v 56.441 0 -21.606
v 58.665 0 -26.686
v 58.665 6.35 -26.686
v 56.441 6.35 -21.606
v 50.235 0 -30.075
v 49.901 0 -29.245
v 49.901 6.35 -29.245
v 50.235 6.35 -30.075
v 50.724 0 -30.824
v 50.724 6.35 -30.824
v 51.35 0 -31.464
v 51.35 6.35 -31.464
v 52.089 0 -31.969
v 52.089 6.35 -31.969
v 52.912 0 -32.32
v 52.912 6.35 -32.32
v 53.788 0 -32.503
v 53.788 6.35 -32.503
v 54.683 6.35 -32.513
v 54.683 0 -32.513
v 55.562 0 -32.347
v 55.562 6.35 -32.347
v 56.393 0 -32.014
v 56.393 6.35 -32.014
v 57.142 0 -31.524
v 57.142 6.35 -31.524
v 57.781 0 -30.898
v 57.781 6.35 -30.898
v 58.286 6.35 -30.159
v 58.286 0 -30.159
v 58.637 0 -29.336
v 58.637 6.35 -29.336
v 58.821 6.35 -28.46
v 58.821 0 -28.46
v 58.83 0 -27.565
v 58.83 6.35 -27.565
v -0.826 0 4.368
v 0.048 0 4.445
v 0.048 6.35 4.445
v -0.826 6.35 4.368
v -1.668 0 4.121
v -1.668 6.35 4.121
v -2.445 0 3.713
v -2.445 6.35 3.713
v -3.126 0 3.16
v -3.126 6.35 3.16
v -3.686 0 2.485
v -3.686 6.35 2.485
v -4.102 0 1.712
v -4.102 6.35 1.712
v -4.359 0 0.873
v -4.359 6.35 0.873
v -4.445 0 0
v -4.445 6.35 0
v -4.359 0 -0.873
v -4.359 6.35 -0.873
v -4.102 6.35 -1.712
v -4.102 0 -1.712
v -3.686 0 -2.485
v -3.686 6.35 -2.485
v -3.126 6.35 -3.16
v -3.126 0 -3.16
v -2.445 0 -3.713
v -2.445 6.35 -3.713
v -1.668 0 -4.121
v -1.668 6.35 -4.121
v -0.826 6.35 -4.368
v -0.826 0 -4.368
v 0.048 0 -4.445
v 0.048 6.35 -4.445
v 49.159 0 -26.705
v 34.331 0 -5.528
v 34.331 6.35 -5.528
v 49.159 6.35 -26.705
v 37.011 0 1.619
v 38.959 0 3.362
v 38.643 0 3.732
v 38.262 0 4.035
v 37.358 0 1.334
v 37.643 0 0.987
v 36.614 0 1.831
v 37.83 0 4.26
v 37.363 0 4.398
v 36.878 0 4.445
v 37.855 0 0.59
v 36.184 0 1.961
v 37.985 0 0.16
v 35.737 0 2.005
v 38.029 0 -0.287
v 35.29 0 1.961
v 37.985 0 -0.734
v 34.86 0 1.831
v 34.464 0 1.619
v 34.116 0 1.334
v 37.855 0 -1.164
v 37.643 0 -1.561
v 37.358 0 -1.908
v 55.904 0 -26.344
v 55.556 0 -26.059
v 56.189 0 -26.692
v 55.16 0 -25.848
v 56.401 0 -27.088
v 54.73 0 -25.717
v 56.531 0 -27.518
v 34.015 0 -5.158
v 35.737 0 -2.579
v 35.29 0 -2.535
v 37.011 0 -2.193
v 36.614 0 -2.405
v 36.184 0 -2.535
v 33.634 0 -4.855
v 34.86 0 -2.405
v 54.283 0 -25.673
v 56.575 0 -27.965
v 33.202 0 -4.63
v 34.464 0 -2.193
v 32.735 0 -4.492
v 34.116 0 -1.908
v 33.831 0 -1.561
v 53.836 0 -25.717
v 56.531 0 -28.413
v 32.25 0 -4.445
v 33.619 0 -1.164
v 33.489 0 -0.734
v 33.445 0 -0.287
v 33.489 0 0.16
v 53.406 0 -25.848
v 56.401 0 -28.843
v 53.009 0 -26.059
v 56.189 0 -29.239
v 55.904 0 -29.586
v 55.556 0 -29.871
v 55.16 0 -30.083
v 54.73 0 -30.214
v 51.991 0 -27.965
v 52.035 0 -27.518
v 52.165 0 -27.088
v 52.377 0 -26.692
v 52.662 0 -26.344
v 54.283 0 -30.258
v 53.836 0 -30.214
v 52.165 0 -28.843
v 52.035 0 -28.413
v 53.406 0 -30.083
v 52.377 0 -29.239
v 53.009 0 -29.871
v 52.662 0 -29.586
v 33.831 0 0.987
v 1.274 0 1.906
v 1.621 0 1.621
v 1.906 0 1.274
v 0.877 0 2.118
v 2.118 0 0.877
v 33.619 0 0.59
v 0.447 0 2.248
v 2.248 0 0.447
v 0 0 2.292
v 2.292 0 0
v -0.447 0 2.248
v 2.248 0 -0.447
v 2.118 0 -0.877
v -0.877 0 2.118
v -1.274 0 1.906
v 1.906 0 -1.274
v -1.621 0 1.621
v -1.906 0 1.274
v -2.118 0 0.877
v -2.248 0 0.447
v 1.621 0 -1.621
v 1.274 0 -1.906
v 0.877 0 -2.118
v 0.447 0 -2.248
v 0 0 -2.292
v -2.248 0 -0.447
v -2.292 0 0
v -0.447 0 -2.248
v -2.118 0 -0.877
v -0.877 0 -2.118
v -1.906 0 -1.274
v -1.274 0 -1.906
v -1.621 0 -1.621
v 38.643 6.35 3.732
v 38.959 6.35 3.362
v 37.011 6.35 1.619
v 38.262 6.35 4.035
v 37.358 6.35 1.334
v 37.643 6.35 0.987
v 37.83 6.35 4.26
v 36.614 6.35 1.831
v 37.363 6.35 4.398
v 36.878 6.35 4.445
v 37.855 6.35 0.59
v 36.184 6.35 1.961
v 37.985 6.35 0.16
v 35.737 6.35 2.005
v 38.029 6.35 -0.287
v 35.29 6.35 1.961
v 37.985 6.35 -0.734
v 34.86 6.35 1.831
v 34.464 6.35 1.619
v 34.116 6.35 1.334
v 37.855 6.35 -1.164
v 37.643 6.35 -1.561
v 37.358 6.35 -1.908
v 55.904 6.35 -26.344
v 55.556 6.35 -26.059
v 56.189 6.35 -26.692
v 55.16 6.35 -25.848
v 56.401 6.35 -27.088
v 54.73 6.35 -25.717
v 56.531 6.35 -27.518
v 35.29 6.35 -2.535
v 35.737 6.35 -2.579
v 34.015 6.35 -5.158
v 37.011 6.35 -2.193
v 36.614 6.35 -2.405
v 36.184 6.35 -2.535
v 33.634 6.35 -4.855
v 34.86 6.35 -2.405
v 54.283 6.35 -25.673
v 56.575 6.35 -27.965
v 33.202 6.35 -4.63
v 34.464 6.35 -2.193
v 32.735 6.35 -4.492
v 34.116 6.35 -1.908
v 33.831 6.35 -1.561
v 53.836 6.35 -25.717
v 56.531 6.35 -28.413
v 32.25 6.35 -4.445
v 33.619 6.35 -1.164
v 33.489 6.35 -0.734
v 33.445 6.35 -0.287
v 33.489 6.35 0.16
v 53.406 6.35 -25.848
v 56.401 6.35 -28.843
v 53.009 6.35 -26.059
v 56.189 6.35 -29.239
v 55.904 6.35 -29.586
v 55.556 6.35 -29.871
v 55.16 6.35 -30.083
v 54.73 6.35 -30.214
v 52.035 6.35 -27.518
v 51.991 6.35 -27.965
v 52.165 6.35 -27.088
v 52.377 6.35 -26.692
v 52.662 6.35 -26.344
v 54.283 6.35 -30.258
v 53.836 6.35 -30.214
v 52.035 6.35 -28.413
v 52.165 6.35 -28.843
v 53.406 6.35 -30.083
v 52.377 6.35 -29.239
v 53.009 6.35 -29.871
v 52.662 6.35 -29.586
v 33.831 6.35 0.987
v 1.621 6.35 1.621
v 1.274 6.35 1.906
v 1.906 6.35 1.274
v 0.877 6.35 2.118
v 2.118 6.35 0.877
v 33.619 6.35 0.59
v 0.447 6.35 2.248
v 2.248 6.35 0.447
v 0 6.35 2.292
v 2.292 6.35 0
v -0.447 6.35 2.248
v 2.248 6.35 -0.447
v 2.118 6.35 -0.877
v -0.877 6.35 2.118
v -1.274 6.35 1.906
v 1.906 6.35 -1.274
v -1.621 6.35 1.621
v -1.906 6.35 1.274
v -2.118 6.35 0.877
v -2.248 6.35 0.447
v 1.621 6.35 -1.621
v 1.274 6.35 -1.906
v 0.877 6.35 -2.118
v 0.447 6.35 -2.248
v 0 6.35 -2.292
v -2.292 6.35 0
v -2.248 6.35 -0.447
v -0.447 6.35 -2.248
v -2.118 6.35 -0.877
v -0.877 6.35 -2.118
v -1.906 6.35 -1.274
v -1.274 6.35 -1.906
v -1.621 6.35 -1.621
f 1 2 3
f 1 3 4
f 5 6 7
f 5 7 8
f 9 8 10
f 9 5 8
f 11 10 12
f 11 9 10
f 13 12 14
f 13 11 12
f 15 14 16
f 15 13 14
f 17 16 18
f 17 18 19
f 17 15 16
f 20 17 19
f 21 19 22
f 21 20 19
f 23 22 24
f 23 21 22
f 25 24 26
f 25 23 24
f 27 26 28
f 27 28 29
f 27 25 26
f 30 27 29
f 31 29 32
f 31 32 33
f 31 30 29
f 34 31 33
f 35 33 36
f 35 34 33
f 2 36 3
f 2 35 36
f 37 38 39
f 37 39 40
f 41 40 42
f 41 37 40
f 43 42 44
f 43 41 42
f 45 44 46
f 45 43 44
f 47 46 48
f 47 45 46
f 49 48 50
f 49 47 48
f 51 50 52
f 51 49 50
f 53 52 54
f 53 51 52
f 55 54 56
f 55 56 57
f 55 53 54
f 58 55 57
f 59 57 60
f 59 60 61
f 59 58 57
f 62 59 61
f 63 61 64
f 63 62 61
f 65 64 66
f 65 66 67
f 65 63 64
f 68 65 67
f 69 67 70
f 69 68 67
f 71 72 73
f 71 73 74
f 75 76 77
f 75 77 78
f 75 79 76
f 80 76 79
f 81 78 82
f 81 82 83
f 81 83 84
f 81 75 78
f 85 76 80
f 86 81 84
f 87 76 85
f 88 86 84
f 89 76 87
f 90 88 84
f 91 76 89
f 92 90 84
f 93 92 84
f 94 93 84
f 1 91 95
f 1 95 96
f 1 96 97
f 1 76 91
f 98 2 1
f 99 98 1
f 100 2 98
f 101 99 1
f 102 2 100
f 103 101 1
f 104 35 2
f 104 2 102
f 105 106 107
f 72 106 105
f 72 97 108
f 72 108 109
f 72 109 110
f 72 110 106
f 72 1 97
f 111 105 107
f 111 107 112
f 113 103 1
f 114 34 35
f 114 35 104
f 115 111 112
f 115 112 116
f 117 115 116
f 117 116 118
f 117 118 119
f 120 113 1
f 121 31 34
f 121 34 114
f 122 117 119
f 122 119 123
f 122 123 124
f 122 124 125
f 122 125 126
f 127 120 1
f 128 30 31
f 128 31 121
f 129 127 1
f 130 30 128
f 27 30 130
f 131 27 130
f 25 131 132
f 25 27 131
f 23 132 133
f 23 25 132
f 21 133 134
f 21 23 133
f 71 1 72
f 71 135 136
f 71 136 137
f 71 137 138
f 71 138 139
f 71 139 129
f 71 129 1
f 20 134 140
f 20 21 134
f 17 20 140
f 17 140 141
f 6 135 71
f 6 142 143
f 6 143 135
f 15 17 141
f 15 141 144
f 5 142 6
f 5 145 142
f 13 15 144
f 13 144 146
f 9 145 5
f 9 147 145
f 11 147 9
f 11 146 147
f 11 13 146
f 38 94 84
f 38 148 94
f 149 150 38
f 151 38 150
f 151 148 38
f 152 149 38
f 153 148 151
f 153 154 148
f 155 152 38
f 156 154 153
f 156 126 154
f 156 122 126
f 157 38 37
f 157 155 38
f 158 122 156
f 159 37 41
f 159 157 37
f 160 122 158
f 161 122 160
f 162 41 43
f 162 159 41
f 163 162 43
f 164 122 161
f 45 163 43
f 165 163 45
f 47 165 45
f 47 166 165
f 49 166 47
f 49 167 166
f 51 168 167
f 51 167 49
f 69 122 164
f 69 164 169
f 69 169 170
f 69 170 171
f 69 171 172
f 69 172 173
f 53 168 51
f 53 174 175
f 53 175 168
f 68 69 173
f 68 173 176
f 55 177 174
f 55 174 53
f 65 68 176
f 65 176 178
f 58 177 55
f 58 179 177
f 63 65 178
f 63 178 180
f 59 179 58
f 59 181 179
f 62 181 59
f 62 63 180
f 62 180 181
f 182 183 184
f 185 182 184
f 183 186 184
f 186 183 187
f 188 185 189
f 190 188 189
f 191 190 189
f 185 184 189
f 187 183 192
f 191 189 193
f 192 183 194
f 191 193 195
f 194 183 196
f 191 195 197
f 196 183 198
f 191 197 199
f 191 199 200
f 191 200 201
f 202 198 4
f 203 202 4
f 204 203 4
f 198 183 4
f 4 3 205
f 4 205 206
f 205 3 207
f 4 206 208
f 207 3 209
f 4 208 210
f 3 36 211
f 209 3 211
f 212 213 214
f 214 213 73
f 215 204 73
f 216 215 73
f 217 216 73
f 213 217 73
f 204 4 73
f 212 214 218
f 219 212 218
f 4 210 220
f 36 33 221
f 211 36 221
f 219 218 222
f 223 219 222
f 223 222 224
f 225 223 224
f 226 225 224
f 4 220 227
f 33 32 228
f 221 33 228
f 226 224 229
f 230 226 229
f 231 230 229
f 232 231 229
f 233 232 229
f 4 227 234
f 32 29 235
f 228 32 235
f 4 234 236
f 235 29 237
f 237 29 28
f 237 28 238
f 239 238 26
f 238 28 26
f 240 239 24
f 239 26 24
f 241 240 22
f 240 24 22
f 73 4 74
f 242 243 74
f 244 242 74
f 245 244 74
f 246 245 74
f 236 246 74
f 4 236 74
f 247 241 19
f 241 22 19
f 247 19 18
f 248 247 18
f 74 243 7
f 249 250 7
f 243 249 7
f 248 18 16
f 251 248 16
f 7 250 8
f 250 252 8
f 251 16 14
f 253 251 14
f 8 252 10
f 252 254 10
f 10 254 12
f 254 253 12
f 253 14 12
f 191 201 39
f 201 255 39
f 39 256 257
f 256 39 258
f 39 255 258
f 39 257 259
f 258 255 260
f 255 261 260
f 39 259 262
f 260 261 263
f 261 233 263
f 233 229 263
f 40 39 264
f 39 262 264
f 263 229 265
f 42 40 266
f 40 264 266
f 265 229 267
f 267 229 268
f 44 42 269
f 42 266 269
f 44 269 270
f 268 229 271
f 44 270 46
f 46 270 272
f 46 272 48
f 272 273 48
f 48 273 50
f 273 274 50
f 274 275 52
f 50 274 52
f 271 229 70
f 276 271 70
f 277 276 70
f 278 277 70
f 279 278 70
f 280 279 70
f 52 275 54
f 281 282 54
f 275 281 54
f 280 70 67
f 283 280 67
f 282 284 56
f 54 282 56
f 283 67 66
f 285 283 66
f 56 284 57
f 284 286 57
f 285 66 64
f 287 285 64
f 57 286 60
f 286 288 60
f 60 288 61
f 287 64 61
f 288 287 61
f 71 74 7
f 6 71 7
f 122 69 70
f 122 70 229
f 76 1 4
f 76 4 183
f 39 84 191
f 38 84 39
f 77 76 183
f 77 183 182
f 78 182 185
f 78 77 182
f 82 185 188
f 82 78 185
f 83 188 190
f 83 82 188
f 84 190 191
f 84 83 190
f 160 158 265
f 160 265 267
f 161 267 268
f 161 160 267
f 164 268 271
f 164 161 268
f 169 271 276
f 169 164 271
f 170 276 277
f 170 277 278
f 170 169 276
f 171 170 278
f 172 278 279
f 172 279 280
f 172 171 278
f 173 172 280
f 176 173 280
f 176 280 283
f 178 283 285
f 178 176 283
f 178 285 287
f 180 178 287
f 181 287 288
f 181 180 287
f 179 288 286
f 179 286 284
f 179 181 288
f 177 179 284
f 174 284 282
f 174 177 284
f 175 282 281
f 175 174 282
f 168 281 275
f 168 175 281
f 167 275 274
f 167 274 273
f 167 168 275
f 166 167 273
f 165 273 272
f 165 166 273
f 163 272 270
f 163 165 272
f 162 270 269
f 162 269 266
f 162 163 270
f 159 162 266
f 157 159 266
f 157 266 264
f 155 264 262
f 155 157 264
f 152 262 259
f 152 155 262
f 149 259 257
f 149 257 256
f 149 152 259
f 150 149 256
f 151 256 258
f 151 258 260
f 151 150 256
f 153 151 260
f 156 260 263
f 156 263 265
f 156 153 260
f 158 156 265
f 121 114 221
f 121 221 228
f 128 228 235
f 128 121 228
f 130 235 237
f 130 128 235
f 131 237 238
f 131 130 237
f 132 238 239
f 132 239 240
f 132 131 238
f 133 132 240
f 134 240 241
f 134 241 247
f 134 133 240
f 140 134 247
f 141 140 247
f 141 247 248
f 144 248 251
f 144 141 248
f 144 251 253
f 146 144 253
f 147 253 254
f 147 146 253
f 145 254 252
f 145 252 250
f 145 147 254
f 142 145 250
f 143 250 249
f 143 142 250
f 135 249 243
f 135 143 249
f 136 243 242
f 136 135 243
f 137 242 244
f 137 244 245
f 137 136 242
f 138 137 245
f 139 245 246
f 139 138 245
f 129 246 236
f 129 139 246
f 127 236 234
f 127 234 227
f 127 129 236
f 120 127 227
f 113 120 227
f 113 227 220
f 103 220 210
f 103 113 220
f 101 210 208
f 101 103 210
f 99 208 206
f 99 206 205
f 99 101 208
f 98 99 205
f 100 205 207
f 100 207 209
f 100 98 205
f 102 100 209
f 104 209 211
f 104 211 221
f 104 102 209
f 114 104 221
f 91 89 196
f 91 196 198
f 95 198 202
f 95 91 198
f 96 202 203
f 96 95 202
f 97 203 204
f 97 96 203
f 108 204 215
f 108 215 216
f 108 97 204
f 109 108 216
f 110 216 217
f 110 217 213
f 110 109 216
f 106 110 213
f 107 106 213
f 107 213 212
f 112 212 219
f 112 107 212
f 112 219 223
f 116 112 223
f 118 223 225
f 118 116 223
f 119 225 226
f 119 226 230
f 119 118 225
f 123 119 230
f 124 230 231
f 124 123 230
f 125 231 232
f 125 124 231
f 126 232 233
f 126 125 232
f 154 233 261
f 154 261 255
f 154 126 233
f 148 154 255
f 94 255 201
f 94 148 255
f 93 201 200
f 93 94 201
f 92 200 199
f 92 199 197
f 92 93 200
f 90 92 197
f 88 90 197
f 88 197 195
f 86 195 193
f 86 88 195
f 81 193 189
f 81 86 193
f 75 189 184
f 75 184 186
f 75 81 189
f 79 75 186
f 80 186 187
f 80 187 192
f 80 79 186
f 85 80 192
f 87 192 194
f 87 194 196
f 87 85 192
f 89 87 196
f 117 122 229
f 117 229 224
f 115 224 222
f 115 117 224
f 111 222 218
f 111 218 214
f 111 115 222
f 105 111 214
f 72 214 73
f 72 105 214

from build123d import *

# Parameters (mm, degrees)
SKETCH1_R           = 2.29235
BOSS_EXTRUDE1_DEPTH = 6.35


with BuildPart() as part:
    # Sketch1 → Boss-Extrude1 (new body)
    with BuildSketch(Plane(origin=(0, 0, 0), x_dir=(1, 0, 0), z_dir=(0, 1, 0))):
        with BuildLine():
            Line((0.048227533, 4.445), (32.250386453, 4.445))
            ThreePointArc((32.250386453, 4.445), (33.423227931, 4.731992484), (34.331032646, 5.528115852))
            Line((34.331032646, 5.528115852), (49.159221832, 26.704964681))
            Line((49.159221832, 26.704964681), (49.900908924, 29.244964681))
            ThreePointArc((49.900908924, 29.244964681), (55.562425443, 32.347386681), (58.664847444, 26.685870162))
            Line((58.664847444, 26.685870162), (56.441483505, 21.605870162))
            Line((56.441483505, 21.605870162), (38.958873725, -3.361884148))
            ThreePointArc((38.958873725, -3.361884148), (38.05106901, -4.158007516), (36.878227533, -4.445))
            Line((36.878227533, -4.445), (0.048227533, -4.445))
            ThreePointArc((0.048227533, -4.445), (-4.445261623, 0), (0.048227533, 4.445))
        make_face()
        Circle(SKETCH1_R, mode=Mode.SUBTRACT)
        with Locations((35.737148471, 0.286992484)):
            Circle(SKETCH1_R, mode=Mode.SUBTRACT)
        with Locations((54.282878184, 27.965417421)):
            Circle(SKETCH1_R, mode=Mode.SUBTRACT)
    extrude(amount=BOSS_EXTRUDE1_DEPTH)


solid = part.part
